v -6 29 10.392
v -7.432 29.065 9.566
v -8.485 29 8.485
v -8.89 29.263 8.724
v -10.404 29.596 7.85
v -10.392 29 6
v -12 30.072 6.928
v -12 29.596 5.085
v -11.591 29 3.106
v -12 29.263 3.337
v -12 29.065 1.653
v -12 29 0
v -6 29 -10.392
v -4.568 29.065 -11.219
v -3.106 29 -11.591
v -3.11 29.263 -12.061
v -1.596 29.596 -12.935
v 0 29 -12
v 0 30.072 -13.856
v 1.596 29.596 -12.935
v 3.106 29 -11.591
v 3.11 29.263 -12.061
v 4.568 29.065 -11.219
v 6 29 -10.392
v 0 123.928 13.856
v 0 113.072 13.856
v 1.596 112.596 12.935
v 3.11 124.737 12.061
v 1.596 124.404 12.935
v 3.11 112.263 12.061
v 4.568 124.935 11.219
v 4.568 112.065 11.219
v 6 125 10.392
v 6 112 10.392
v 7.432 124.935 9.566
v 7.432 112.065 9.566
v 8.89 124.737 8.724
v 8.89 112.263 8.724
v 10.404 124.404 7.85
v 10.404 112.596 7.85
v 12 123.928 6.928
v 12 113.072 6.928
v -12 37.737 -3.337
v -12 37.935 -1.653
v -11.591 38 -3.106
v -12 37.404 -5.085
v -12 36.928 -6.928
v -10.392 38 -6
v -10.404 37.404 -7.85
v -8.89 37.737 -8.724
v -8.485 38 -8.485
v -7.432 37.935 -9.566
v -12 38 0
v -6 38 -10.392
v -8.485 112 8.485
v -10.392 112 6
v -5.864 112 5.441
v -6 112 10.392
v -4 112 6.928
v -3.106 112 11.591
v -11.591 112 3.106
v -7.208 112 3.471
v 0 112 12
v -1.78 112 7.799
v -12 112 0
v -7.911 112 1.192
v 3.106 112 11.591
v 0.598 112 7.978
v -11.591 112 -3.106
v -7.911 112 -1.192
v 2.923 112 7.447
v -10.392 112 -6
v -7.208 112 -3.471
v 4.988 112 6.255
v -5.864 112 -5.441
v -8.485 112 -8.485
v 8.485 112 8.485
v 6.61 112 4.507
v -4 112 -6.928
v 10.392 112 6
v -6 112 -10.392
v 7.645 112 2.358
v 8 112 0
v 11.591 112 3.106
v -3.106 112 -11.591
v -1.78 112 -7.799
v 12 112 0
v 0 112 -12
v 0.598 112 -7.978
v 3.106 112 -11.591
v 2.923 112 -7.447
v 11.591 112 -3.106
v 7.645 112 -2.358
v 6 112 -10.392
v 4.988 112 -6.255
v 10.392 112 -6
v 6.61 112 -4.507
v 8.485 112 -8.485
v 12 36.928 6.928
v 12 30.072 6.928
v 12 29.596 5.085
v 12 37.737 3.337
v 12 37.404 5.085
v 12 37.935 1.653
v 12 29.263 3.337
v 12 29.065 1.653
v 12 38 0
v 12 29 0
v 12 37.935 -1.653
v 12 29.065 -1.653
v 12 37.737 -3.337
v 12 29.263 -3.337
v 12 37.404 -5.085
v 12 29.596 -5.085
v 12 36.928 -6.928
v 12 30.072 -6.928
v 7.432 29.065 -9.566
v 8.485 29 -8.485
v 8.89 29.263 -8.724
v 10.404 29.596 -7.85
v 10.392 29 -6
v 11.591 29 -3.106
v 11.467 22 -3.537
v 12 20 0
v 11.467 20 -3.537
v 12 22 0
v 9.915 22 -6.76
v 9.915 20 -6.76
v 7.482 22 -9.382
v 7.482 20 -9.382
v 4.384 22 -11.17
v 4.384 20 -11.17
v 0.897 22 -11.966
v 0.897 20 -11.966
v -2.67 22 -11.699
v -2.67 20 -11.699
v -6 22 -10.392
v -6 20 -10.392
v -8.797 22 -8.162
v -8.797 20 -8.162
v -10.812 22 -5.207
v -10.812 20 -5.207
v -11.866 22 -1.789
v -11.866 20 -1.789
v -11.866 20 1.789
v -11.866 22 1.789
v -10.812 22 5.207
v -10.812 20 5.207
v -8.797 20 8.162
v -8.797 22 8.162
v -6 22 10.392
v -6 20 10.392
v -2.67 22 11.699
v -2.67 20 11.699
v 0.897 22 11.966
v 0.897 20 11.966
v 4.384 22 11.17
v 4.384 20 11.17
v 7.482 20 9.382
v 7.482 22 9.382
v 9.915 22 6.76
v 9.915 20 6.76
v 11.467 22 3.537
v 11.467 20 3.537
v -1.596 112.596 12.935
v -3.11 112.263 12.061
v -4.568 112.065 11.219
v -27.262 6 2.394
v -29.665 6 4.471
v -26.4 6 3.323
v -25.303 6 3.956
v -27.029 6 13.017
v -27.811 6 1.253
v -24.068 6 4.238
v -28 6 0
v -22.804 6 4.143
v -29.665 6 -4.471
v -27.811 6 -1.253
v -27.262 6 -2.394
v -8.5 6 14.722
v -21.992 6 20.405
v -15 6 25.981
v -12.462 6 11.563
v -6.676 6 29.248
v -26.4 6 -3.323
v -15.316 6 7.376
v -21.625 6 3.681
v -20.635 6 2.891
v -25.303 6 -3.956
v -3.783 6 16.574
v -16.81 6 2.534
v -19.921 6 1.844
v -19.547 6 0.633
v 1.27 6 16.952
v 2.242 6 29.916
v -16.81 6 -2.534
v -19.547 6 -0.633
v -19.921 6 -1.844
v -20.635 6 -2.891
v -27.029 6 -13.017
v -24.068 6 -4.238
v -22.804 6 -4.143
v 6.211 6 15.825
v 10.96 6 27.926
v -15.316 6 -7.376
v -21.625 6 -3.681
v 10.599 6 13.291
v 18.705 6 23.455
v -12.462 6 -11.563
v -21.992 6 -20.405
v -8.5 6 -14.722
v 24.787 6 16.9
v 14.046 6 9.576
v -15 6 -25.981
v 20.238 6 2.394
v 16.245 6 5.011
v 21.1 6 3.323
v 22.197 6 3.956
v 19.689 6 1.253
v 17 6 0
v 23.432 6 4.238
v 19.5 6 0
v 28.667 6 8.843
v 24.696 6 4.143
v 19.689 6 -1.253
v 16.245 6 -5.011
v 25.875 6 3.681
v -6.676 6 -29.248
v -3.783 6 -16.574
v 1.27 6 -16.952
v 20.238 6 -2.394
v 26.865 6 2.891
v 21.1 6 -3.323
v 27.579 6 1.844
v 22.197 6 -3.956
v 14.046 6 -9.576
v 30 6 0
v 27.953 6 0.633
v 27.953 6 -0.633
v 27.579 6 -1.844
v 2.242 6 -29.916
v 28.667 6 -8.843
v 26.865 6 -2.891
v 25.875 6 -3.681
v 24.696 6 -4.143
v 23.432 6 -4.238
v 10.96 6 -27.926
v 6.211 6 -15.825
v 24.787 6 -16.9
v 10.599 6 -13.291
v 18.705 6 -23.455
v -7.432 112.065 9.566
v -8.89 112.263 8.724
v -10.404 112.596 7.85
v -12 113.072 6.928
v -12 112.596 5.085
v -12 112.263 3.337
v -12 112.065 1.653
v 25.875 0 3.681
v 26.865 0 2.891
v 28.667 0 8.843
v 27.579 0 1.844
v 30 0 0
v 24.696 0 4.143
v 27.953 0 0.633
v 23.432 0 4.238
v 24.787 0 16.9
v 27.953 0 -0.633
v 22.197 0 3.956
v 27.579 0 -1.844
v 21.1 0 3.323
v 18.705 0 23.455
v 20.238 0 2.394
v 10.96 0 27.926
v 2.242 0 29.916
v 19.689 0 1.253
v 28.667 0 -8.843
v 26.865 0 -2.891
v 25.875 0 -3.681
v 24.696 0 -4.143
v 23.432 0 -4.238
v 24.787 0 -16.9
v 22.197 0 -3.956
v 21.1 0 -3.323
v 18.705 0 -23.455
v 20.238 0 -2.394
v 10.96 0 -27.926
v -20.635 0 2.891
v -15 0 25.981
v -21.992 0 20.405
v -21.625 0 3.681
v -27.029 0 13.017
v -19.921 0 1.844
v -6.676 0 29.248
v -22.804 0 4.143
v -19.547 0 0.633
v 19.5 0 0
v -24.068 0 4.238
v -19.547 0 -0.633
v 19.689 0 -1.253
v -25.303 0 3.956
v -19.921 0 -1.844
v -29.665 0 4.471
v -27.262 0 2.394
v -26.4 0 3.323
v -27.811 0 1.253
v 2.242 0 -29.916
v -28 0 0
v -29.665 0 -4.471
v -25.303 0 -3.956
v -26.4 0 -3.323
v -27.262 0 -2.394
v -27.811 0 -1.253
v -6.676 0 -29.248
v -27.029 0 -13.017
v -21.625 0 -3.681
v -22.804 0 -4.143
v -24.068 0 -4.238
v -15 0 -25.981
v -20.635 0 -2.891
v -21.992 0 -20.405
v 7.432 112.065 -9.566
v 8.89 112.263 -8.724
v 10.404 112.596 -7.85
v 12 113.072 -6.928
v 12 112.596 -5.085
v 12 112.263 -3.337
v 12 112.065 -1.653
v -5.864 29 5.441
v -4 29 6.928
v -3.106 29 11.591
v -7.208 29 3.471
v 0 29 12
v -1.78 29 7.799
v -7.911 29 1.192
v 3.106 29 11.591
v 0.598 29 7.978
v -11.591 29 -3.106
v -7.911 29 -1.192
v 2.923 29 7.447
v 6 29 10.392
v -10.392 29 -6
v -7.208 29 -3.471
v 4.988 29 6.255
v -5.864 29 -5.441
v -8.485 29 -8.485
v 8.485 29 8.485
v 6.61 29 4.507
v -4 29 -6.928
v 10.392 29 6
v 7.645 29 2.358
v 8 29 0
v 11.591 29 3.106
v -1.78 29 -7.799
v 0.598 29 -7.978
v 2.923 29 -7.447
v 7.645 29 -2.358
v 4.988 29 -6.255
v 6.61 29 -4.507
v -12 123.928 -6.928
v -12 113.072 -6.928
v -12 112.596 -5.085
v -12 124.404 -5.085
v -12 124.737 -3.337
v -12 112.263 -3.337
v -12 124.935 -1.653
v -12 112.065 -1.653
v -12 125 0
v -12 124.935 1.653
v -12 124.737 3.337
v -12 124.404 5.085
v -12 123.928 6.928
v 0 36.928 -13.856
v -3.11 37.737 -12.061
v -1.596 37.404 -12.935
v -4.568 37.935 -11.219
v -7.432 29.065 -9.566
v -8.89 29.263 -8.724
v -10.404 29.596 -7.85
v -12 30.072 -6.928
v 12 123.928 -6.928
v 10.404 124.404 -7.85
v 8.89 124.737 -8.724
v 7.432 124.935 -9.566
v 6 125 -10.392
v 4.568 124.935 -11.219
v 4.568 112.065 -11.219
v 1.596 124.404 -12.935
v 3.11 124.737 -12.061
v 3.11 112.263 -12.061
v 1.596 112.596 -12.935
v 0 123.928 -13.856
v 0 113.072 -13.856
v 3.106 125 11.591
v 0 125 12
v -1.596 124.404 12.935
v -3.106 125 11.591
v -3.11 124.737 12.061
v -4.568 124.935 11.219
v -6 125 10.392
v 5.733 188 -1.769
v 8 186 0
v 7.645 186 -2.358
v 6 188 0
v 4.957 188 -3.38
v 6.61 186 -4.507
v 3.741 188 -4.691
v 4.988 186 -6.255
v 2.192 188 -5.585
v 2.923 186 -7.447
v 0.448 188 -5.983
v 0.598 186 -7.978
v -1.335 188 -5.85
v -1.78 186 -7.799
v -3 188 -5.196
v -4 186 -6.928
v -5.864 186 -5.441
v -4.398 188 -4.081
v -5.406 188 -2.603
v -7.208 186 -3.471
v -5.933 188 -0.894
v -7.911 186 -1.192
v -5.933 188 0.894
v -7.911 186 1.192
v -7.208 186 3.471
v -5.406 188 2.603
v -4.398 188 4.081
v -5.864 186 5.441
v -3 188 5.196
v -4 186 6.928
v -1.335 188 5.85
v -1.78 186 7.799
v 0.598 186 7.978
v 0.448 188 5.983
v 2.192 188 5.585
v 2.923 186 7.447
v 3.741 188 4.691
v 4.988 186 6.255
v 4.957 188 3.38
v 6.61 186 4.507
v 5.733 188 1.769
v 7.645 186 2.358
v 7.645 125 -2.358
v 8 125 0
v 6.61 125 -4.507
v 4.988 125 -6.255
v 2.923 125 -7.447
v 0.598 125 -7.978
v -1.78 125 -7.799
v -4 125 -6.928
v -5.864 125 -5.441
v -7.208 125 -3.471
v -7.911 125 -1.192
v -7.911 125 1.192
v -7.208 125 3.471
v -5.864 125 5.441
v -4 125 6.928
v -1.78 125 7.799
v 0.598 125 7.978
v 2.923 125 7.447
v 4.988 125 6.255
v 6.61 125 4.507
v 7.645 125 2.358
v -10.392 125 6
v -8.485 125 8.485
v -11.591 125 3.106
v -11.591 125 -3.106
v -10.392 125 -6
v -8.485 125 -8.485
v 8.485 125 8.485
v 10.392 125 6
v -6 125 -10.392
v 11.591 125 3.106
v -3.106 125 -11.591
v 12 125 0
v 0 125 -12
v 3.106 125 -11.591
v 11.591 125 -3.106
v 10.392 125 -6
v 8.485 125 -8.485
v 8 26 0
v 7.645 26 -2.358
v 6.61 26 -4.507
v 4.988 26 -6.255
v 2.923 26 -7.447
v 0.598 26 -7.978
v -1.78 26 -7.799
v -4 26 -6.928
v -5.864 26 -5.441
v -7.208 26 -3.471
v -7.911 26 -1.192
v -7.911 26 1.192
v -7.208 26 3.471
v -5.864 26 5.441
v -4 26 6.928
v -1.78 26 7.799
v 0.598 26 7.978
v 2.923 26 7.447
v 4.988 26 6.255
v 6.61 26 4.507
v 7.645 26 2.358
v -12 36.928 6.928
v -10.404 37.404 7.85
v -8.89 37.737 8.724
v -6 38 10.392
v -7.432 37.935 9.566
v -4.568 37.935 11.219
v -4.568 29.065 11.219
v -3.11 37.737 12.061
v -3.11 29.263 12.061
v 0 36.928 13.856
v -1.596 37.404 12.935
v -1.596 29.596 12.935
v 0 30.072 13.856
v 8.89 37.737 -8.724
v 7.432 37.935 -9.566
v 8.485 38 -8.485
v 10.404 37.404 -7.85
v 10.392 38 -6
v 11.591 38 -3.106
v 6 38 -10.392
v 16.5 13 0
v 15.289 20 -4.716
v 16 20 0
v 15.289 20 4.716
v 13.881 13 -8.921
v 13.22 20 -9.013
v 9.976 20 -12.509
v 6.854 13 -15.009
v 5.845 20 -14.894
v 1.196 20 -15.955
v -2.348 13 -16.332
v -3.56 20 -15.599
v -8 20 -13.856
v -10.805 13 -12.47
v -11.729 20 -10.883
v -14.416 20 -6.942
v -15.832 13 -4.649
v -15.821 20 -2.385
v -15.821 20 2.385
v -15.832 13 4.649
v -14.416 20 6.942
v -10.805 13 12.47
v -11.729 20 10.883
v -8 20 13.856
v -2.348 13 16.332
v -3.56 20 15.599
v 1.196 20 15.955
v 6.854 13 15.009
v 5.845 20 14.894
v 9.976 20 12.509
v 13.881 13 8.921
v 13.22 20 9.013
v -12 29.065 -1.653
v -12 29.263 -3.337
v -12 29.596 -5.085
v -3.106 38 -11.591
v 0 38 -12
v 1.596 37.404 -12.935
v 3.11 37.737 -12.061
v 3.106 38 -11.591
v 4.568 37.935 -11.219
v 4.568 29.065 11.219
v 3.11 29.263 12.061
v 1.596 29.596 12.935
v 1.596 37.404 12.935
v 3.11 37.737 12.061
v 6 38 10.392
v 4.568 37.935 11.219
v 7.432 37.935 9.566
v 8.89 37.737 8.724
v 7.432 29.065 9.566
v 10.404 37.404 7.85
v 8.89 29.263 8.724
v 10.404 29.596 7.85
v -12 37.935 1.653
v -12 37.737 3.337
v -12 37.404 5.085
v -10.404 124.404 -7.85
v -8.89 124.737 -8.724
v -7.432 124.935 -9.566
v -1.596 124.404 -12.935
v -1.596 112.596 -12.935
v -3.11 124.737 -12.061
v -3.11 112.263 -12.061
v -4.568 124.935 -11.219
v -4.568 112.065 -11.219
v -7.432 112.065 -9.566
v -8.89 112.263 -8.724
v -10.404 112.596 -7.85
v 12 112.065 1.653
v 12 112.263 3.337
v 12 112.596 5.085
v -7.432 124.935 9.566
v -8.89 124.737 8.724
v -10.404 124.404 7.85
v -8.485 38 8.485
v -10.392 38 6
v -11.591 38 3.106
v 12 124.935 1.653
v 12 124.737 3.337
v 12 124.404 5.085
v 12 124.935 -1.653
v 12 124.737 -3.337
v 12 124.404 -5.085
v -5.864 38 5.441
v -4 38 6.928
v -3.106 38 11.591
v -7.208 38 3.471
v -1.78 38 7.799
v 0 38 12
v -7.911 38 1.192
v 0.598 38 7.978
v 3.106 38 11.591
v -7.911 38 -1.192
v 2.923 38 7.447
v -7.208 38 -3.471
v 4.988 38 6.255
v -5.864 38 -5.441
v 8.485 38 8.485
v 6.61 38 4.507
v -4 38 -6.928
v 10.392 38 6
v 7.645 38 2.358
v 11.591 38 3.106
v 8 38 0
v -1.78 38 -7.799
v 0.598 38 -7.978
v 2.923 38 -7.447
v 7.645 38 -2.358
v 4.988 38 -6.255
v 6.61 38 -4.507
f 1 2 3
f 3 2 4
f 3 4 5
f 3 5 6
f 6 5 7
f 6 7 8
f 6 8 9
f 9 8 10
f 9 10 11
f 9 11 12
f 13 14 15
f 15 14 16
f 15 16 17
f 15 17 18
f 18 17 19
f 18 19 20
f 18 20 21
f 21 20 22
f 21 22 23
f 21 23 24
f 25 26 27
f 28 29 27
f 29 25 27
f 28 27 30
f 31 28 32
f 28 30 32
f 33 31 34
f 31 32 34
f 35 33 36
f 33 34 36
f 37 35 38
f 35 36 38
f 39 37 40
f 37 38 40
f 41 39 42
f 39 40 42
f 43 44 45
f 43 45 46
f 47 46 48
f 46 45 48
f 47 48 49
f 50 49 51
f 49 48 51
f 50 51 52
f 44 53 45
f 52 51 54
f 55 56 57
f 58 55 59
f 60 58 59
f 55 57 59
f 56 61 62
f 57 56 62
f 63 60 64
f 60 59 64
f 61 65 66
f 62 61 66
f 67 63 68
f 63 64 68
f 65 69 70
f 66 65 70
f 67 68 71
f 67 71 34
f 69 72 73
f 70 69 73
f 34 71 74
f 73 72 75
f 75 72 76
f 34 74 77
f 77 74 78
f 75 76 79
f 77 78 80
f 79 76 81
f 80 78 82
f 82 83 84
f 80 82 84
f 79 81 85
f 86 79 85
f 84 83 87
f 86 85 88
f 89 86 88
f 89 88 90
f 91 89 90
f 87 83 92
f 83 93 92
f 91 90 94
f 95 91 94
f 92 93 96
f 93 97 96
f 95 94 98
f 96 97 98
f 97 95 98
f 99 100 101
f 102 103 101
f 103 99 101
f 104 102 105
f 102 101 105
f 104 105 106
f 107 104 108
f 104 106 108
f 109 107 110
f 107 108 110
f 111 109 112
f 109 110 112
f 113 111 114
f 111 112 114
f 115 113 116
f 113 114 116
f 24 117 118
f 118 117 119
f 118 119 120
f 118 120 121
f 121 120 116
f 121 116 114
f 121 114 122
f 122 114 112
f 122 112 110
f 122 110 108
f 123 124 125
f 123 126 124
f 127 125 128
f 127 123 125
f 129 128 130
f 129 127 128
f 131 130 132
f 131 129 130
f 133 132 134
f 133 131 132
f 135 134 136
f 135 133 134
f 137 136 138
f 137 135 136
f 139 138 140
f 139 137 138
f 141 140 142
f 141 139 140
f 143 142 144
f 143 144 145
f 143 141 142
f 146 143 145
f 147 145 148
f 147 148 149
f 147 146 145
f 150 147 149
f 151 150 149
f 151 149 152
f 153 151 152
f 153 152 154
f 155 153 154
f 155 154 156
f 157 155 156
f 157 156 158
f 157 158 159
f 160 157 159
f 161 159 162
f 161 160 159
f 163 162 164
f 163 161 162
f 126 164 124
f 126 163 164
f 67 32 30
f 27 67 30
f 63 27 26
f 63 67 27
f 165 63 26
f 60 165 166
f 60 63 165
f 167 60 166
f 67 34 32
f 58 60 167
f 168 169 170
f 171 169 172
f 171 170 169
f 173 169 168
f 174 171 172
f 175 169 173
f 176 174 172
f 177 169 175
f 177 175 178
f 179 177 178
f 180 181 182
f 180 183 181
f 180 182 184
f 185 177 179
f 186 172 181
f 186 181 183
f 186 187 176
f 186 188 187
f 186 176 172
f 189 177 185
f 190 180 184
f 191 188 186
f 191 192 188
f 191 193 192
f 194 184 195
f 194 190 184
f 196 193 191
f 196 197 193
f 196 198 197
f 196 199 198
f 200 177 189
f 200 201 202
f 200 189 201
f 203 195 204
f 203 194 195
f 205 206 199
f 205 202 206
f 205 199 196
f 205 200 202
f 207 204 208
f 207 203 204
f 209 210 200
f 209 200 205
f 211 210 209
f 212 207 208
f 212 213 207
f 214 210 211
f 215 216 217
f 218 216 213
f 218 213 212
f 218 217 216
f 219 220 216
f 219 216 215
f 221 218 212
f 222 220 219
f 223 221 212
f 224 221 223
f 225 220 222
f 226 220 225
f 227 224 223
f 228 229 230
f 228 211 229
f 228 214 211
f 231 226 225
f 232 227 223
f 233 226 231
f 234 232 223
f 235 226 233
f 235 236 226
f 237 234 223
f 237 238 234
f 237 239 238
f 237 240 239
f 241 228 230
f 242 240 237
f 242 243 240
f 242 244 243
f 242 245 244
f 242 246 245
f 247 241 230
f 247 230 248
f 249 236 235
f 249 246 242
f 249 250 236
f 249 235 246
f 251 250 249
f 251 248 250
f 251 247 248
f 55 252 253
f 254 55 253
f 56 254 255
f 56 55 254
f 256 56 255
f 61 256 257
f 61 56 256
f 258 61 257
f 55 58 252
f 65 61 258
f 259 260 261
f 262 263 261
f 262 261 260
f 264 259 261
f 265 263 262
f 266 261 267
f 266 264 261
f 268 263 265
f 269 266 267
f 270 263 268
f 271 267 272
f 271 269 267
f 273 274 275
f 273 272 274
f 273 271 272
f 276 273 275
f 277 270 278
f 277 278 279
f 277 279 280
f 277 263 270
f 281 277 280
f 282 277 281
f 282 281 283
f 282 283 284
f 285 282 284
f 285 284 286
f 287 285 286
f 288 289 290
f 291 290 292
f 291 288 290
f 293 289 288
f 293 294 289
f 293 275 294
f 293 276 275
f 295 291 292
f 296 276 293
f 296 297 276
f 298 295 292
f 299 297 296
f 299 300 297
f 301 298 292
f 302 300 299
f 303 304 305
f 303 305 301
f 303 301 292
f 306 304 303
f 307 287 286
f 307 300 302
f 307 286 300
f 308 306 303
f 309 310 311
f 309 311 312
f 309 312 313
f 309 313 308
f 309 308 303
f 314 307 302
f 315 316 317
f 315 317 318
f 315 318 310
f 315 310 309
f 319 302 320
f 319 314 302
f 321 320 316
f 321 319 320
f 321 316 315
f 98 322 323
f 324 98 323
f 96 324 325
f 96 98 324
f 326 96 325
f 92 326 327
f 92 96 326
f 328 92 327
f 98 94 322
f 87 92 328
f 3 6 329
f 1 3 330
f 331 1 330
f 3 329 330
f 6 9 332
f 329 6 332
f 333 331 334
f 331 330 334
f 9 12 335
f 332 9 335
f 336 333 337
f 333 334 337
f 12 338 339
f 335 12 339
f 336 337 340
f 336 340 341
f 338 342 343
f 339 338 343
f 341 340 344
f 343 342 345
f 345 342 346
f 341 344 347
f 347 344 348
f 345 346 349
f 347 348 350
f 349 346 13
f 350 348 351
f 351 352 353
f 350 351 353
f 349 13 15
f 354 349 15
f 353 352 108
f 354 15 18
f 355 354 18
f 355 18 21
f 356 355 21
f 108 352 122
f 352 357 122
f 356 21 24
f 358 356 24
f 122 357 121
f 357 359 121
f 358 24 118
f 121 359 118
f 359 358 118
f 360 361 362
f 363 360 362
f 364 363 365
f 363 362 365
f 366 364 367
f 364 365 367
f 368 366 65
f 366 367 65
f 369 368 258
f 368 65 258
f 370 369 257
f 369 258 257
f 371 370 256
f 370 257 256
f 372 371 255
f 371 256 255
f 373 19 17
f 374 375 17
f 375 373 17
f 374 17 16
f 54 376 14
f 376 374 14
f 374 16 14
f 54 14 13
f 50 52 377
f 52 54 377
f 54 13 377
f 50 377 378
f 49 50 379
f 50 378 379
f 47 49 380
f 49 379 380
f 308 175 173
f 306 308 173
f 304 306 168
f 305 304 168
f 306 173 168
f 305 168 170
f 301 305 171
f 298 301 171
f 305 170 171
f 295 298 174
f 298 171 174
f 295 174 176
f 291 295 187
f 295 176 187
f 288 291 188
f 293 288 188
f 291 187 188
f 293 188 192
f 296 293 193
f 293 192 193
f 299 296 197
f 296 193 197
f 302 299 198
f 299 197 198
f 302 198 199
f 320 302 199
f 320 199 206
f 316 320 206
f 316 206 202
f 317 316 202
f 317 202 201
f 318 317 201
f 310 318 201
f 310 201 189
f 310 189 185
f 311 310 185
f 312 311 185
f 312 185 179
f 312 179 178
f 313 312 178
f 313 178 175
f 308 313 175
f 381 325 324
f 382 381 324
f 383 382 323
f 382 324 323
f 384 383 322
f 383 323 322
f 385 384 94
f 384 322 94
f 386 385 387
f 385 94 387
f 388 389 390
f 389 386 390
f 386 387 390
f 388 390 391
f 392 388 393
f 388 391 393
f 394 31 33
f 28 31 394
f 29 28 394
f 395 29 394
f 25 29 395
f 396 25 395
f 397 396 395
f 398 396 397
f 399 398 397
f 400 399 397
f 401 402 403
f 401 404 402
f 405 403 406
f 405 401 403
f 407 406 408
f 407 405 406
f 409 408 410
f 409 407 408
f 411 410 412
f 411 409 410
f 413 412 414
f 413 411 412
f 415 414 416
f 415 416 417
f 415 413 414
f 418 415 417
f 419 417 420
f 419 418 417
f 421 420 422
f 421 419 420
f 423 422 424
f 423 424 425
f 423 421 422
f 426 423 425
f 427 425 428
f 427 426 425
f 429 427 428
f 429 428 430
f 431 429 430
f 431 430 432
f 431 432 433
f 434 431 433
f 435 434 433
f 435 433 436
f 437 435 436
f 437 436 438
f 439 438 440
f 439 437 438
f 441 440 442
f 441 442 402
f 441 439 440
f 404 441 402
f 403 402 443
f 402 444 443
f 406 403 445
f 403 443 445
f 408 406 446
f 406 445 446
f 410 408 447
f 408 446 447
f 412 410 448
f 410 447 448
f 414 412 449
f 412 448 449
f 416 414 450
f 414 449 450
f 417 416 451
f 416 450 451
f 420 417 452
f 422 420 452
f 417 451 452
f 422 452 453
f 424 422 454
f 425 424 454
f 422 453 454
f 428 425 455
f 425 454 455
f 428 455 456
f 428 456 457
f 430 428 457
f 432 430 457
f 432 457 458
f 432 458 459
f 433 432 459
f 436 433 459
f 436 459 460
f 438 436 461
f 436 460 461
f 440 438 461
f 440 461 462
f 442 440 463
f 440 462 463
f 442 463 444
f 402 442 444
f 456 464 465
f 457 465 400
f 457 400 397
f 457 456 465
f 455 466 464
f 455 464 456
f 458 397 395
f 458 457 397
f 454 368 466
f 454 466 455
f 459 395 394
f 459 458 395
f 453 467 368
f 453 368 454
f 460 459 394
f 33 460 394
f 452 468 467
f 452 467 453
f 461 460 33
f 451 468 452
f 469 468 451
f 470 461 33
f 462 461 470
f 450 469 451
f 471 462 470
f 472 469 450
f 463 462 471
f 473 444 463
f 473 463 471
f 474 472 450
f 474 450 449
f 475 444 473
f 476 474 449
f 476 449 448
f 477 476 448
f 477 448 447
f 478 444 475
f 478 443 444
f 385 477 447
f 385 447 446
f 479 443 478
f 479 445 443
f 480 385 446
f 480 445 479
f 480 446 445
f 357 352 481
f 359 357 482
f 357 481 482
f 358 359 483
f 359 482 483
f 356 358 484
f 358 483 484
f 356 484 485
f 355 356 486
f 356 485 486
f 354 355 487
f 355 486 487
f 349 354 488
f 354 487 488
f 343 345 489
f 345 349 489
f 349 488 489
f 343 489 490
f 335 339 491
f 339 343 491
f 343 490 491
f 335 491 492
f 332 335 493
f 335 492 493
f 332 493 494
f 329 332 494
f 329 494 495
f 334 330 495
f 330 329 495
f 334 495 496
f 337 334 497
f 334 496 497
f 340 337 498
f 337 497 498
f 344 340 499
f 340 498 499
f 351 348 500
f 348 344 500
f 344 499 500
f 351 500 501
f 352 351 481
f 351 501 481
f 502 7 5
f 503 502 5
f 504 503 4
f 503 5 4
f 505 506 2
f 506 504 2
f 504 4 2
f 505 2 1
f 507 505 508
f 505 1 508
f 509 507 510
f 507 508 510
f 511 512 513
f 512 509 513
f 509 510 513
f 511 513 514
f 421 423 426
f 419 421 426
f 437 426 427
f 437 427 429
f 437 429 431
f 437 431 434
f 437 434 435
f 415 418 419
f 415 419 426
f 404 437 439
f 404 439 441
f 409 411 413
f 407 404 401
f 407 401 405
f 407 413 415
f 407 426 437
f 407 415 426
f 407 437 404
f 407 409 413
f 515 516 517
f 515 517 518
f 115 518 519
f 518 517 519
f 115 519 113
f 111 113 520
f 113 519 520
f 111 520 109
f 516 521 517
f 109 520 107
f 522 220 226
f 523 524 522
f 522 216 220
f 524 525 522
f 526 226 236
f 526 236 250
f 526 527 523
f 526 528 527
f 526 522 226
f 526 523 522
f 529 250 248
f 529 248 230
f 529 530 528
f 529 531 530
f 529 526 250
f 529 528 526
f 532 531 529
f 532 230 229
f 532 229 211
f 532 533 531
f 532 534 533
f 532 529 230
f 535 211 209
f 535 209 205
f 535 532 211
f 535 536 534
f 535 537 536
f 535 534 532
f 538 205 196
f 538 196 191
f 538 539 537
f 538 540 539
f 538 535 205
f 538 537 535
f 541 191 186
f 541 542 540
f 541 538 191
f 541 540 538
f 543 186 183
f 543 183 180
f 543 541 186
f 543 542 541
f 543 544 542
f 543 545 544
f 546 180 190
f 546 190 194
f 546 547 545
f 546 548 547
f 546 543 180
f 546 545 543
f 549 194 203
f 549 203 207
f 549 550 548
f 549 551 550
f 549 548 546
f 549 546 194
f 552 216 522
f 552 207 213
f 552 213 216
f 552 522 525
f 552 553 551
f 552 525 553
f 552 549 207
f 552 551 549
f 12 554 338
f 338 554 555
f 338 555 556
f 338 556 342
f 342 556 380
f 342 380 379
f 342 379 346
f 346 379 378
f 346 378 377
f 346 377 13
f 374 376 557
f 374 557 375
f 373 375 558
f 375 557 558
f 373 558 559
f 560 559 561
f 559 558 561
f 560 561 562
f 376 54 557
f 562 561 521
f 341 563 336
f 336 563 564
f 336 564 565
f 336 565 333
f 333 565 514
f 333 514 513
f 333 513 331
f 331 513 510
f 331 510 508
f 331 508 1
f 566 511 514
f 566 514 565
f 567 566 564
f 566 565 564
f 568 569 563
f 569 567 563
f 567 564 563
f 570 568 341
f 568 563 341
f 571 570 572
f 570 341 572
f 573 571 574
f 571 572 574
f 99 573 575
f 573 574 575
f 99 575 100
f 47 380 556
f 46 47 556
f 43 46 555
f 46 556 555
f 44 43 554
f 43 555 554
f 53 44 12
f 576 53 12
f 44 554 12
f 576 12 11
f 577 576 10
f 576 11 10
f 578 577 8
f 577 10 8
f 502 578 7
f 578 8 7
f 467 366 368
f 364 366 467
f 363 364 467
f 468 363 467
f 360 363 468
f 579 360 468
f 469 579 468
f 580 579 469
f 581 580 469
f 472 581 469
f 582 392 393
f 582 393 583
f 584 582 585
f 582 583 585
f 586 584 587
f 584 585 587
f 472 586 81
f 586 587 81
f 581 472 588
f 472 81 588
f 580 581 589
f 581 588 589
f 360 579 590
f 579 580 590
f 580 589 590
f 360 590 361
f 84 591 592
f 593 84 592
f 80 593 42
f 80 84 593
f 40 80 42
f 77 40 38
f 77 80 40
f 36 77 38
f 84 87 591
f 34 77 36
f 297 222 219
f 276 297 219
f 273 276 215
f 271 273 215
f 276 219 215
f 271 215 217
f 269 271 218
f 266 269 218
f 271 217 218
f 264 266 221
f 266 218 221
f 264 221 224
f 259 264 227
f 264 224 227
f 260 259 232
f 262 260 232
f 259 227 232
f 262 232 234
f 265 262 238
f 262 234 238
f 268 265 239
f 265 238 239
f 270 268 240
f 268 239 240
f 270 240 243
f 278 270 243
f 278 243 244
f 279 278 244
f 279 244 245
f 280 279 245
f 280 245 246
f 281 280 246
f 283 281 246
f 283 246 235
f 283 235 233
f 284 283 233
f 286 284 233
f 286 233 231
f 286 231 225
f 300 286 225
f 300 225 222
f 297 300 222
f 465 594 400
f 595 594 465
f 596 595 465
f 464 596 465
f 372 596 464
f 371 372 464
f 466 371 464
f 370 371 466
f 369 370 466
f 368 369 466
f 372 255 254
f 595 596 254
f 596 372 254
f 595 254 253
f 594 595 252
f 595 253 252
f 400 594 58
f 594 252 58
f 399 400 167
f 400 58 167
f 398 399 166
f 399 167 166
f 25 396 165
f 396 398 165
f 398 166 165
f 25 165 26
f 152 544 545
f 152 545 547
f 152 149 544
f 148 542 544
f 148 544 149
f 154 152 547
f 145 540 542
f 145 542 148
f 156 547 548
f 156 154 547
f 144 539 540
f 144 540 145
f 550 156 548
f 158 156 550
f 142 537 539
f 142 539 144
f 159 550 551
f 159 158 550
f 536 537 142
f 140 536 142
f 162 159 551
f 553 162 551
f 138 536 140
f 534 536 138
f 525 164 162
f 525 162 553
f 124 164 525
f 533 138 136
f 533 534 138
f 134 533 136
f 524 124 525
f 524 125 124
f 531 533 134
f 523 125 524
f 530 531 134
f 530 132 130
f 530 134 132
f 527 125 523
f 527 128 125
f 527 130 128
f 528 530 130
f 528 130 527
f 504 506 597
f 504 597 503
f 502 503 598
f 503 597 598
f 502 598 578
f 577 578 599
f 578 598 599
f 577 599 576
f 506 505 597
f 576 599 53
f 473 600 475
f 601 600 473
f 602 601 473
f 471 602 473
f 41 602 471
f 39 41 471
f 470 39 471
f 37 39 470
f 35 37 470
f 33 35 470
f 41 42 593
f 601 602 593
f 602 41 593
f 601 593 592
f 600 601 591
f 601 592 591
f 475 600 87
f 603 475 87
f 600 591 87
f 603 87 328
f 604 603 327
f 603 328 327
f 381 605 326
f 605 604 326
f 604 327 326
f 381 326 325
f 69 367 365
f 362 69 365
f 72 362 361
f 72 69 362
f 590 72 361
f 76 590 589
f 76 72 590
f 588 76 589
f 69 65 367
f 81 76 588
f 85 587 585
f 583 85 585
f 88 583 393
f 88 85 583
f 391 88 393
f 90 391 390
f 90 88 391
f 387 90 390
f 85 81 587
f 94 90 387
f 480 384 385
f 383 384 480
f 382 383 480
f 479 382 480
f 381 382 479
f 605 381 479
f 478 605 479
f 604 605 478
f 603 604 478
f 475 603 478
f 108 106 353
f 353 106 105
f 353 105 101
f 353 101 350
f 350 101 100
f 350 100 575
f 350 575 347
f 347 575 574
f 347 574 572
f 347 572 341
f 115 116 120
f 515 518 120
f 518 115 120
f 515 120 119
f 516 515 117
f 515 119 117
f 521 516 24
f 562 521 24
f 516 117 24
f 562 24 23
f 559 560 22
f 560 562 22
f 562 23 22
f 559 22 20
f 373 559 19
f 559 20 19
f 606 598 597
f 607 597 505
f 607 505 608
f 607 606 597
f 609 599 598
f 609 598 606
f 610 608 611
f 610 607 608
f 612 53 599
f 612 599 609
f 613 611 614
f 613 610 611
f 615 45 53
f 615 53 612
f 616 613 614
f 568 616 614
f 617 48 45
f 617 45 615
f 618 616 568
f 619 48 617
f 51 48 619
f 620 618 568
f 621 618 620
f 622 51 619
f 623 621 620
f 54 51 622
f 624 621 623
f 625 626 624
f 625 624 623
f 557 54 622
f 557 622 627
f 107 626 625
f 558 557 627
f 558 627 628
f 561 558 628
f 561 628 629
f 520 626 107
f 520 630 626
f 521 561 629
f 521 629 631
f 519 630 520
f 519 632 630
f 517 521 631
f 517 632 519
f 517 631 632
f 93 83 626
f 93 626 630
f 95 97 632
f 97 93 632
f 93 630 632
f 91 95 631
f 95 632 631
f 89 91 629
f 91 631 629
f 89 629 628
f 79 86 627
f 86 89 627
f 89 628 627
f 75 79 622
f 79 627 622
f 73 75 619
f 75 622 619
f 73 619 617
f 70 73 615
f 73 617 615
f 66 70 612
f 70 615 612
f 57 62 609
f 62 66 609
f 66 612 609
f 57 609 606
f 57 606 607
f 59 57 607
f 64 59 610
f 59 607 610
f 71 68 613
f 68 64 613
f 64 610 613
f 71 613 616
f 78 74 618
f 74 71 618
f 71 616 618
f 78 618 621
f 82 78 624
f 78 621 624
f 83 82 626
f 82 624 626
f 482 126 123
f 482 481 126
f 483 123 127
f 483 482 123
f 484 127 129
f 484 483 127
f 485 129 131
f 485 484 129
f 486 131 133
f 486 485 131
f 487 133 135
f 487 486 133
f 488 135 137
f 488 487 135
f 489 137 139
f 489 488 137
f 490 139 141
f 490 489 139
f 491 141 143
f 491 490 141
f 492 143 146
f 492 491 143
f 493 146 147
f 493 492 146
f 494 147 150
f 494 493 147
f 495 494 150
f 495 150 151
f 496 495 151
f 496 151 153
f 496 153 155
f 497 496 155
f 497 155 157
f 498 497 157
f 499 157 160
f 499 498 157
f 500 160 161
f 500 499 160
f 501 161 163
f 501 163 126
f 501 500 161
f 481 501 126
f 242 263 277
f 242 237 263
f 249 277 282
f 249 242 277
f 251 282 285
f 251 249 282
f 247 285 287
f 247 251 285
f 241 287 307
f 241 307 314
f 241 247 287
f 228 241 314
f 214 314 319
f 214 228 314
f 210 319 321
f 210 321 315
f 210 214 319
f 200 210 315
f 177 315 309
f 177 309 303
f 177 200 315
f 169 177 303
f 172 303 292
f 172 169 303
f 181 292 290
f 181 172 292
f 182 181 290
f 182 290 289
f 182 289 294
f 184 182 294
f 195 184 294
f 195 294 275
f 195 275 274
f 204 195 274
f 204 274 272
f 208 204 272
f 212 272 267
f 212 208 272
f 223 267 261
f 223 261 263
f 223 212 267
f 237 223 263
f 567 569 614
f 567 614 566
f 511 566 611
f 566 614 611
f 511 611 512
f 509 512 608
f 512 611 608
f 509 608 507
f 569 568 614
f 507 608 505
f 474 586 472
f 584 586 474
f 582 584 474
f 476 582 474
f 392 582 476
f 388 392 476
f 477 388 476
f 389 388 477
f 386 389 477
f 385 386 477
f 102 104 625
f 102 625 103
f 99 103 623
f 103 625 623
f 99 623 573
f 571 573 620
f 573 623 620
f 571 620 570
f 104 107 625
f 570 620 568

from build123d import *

# Parameters (mm, degrees)
EXTRUDE_1_DEPTH     = 9
EXTRUDE_2_DEPTH     = 13
SKETCH_5_R          = 4.25
CUT_EXTRUDE_1_DEPTH = 7


with BuildPart() as part:
    # Эскиз1 → Повернуть1 (revolve)
    with BuildSketch(Plane.XY, mode=Mode.PRIVATE) as revolve_1_sk:
        Polygon((0, 0), (-30, 0), (-30, 6), (-17, 6), (-16, 20), (-12, 20), (-12, 22), (-8, 26), (-8, 29), (-8, 38), (-8, 186), (-6, 188), (0, 188), align=None)
    revolve(revolve_1_sk.sketch.rotate(Axis((0, 0, 0), (0, 1, 0)), 180), axis=Axis((0, 0, 0), (0, 1, 0)))  # turned: the seam where the file's is

    # Эскиз2 → Бобышка-Вытянуть1 (add)
    with BuildSketch(Plane(origin=(0, 29, 0), x_dir=(1, 0, 0), z_dir=(0, 1, 0))):
        Polygon((0, 13.856406461), (-12, 6.92820323), (-12, -6.92820323), (0, -13.856406461), (12, -6.92820323), (12, 6.92820323), align=None)
    extrude(amount=EXTRUDE_1_DEPTH)

    # Эскиз3 → Бобышка-Вытянуть2 (add)
    with BuildSketch(Plane(origin=(0, 112, 0), x_dir=(1, 0, 0), z_dir=(0, 1, 0))):
        Polygon((12, 6.92820323), (0, 13.856406461), (-12, 6.92820323), (-12, -6.92820323), (0, -13.856406461), (12, -6.92820323), align=None)
    extrude(amount=EXTRUDE_2_DEPTH)

    # Эскиз4 → Вырез-Повернуть2 (revolve, cut)
    with BuildSketch(Plane.XY, mode=Mode.PRIVATE) as cut_revolve_2_sk:
        Polygon((-23.258330249, 125), (-12, 125), (-23.258330249, 118.5), align=None)
        Polygon((-23.258330249, 112), (-23.258330249, 118.5), (-12, 112), align=None)
        Polygon((-19.794228634, 38), (-19.794228634, 33.5), (-12, 38), align=None)
        Polygon((-19.794228634, 33.5), (-19.794228634, 29), (-12, 29), align=None)
    revolve(cut_revolve_2_sk.sketch.rotate(Axis((0, 188, 0), (0, -1, 0)), 180), axis=Axis((0, 188, 0), (0, -1, 0)), mode=Mode.SUBTRACT)  # turned: the seam where the file's is

    # Эскиз5 → Вырез-Вытянуть1 (cut, through all)
    with BuildSketch(Plane(origin=(0, 6, 0), x_dir=(1, 0, 0), z_dir=(0, 1, 0))):
        with Locations(Location((-23.75, 0, 0), (0, 0, 180))):  # turned: the seam where the file's is
            Circle(SKETCH_5_R)
        with Locations(Location((23.75, 0, 0), (0, 0, 180))):  # turned: the seam where the file's is
            Circle(SKETCH_5_R)
    extrude(amount=-CUT_EXTRUDE_1_DEPTH, mode=Mode.SUBTRACT)


solid = part.part
